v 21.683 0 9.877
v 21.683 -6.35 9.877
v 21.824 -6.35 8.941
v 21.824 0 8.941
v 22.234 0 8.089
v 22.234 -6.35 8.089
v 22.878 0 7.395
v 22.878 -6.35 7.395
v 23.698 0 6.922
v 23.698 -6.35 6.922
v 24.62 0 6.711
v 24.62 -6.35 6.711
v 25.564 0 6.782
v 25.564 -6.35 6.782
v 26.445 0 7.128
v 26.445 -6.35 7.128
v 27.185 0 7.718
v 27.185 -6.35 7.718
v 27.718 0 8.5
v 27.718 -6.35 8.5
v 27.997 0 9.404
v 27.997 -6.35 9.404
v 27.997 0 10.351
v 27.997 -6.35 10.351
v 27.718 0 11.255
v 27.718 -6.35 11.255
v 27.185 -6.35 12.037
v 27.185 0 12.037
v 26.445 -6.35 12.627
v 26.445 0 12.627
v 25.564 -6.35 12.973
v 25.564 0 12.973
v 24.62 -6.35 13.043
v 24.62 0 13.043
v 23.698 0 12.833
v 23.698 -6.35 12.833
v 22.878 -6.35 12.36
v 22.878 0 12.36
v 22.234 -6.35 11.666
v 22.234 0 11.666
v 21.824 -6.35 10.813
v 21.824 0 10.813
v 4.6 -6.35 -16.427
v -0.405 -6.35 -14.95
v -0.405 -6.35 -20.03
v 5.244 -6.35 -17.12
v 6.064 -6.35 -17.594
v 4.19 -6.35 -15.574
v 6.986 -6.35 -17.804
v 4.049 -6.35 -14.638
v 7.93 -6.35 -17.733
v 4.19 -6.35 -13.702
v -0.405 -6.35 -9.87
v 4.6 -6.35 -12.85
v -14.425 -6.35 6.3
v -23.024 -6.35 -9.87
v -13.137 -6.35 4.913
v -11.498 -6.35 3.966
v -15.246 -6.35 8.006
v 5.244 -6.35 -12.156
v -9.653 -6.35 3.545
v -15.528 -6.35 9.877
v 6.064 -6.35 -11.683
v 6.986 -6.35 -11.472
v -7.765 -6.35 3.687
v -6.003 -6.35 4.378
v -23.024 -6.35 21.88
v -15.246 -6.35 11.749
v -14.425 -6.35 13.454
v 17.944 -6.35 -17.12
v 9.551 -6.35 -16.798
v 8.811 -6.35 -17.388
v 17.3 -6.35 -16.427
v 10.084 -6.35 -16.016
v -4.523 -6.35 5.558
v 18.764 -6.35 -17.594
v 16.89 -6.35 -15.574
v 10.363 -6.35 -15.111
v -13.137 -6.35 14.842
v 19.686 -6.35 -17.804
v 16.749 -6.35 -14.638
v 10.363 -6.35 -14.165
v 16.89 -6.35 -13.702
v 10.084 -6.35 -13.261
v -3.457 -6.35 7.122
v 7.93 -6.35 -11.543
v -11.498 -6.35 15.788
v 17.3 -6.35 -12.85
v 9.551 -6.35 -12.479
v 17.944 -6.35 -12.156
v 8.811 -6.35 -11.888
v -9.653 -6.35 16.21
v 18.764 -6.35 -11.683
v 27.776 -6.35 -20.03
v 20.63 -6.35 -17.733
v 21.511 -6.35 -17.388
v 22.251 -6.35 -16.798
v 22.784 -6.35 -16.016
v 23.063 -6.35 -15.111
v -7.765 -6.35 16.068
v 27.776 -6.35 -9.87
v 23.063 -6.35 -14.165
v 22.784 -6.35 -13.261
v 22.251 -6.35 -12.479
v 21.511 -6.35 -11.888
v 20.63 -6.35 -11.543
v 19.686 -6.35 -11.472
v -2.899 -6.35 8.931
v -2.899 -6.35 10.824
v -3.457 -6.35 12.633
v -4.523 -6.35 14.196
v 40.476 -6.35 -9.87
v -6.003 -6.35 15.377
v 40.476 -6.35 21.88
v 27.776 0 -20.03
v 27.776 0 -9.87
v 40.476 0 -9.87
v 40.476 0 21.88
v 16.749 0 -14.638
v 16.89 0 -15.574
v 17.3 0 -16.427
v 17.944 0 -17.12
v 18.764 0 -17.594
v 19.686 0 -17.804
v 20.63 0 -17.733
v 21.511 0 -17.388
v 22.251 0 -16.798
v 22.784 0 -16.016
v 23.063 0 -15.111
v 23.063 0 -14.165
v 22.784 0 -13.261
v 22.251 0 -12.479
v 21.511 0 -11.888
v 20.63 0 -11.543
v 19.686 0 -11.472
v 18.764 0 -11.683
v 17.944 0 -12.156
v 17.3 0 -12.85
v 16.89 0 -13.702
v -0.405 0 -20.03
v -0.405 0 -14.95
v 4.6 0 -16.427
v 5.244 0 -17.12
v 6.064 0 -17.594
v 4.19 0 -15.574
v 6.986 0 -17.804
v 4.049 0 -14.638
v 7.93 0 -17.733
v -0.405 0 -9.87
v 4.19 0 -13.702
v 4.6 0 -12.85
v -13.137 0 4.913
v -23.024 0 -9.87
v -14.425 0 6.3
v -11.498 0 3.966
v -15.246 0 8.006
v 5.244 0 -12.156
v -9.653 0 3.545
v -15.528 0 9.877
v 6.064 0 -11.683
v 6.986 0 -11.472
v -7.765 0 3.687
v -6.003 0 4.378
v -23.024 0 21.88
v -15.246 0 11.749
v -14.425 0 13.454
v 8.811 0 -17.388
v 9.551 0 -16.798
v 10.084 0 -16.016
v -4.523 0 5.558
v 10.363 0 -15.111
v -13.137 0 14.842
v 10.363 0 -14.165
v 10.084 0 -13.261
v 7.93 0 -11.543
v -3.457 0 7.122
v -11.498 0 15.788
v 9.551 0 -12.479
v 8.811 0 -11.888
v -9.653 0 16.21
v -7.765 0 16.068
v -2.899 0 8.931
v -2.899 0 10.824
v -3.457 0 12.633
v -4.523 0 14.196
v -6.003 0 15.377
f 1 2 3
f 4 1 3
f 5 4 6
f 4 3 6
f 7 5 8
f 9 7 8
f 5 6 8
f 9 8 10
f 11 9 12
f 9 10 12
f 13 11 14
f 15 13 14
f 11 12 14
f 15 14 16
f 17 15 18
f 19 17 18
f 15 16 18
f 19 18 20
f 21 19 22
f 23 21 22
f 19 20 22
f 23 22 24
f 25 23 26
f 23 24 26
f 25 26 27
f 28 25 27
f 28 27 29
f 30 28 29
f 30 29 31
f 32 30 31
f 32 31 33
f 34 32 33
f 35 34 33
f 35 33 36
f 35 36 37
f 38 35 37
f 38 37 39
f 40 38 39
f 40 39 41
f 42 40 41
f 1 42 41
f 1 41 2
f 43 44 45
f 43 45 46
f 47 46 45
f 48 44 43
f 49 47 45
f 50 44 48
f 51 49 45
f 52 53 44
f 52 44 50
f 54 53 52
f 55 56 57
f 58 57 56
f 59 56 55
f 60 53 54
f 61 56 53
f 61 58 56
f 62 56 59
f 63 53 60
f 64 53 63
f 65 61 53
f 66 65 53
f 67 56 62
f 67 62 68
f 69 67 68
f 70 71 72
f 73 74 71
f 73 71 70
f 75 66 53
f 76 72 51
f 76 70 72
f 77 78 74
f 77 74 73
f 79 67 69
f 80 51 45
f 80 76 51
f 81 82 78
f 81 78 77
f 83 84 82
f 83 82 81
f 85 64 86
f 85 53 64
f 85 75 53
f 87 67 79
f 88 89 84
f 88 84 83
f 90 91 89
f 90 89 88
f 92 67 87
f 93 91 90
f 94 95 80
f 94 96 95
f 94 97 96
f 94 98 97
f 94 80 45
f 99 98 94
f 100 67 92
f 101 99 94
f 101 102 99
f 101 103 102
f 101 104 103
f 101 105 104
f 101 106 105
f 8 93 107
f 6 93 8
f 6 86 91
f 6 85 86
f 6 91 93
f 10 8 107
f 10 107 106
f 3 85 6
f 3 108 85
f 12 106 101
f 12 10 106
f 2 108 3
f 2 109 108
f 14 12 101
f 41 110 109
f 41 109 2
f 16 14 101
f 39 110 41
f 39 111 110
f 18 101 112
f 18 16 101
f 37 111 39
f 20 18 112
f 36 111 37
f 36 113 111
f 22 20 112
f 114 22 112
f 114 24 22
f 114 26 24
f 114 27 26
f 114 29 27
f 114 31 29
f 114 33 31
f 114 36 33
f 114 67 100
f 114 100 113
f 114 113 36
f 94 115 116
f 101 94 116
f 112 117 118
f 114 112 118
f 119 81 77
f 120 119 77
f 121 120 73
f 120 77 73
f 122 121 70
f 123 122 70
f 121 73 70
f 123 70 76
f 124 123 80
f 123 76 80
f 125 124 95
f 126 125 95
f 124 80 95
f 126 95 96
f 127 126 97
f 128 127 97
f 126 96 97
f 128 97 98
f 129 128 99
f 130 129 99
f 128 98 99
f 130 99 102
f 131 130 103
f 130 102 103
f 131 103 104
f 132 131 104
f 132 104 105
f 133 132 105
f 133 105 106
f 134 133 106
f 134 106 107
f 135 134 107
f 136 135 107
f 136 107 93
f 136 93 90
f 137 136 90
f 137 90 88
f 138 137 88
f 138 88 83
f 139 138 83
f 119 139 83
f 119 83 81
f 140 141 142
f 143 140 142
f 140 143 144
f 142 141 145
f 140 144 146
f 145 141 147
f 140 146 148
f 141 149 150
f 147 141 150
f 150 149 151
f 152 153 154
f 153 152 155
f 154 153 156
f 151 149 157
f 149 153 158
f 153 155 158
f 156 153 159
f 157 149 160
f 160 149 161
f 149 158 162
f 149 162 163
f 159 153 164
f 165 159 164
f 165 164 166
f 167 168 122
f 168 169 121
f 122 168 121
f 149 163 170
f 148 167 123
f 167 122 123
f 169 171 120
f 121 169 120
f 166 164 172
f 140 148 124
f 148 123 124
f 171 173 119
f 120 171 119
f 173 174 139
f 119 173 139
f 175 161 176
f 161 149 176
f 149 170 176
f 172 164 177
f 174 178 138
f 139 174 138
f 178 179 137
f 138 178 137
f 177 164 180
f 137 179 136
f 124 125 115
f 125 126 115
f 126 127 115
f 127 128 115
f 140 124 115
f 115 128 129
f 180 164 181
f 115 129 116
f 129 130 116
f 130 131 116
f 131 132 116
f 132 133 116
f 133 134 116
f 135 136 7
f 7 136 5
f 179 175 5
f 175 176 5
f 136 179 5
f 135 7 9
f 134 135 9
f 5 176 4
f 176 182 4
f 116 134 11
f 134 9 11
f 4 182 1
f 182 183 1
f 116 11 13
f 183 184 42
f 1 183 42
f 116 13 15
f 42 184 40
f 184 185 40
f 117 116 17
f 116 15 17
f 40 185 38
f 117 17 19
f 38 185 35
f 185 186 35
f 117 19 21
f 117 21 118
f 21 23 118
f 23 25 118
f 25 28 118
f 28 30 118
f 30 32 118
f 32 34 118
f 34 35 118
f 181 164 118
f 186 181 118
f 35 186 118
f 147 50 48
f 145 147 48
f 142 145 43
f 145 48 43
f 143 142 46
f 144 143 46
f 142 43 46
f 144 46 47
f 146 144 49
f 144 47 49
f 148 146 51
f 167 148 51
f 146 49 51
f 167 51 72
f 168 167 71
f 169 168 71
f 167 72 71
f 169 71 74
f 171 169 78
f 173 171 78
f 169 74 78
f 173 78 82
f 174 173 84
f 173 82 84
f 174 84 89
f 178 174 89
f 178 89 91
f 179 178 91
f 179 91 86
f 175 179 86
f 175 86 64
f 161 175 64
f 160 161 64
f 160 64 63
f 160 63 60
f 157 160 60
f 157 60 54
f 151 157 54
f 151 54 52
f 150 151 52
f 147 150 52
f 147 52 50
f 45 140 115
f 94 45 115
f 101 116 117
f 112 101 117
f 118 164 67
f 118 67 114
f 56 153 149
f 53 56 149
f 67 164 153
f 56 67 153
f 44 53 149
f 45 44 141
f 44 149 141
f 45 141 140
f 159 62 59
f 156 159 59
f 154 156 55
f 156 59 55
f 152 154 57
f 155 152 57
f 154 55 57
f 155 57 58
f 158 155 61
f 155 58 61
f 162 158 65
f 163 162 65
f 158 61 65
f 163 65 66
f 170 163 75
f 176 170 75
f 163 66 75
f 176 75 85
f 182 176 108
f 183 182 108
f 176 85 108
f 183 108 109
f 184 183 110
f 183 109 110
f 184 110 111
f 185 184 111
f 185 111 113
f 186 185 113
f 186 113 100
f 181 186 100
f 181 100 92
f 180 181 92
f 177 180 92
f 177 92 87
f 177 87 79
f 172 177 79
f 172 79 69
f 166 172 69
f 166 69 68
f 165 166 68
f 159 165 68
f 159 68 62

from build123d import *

# Parameters (mm, degrees)
F0_W     = 63.5
F0_H     = 12.7
F0_W_2   = 28.1816057964
F0_H_2   = 5.08
F1_DEPTH = 6.35
F2_D     = 12.7
F2_DEPTH = 12.7
F2_TIP   = 3.8154649308
F3_D     = 6.35
F3_DEPTH = 12.7
F3_TIP   = 1.9077324654
F4_D     = 6.35
F4_DEPTH = 12.7
F4_TIP   = 1.9077324654


with BuildPart() as f1:
    # F0 (on Front) → F1 (new body)
    with BuildSketch(Plane.XZ):
        with Locations((8.7264817292, 15.5304455166)):
            Rectangle(F0_W, F0_H)
        Polygon((40.4764817292, 9.1804455166), (-23.0235182708, 9.1804455166), (-23.0235182708, -9.8695544834), (-0.4051240673, -9.8695544834), (-0.4051240673, -14.9495544834), (27.7764817292, -14.9495544834), (27.7764817292, -9.8695544834), (40.4764817292, -9.8695544834), align=None)
        with Locations((13.685678831, -17.4895544834)):
            Rectangle(F0_W_2, F0_H_2)
    extrude(amount=F1_DEPTH)

    # F2
    with Locations(Plane(origin=(0, 0, 0), x_dir=(1, 0, 0), z_dir=(0, 1, 0))):
        with Locations((-9.1782798991, -9.8773387097)):
            Hole(F2_D / 2, depth=F2_DEPTH)
            with Locations((0, 0, -(F2_DEPTH + F2_TIP / 2))):  # 118° drill point
                Cone(0, F2_D / 2, F2_TIP, mode=Mode.SUBTRACT)

    # F3
    with Locations(Plane(origin=(0, 0, 0), x_dir=(1, 0, 0), z_dir=(0, 1, 0))):
        with Locations((24.8577201009, -9.8773387097)):
            Hole(F3_D / 2, depth=F3_DEPTH)
            with Locations((0, 0, -(F3_DEPTH + F3_TIP / 2))):  # 118° drill point
                Cone(0, F3_D / 2, F3_TIP, mode=Mode.SUBTRACT)

    # F4
    with Locations(Plane(origin=(0, 0, 0), x_dir=(1, 0, 0), z_dir=(0, 1, 0))):
        with Locations((7.2235863984, 14.6380947129), (19.9235863984, 14.6380947129)):
            Hole(F4_D / 2, depth=F4_DEPTH)
            with Locations((0, 0, -(F4_DEPTH + F4_TIP / 2))):  # 118° drill point
                Cone(0, F4_D / 2, F4_TIP, mode=Mode.SUBTRACT)


solid = f1.part
